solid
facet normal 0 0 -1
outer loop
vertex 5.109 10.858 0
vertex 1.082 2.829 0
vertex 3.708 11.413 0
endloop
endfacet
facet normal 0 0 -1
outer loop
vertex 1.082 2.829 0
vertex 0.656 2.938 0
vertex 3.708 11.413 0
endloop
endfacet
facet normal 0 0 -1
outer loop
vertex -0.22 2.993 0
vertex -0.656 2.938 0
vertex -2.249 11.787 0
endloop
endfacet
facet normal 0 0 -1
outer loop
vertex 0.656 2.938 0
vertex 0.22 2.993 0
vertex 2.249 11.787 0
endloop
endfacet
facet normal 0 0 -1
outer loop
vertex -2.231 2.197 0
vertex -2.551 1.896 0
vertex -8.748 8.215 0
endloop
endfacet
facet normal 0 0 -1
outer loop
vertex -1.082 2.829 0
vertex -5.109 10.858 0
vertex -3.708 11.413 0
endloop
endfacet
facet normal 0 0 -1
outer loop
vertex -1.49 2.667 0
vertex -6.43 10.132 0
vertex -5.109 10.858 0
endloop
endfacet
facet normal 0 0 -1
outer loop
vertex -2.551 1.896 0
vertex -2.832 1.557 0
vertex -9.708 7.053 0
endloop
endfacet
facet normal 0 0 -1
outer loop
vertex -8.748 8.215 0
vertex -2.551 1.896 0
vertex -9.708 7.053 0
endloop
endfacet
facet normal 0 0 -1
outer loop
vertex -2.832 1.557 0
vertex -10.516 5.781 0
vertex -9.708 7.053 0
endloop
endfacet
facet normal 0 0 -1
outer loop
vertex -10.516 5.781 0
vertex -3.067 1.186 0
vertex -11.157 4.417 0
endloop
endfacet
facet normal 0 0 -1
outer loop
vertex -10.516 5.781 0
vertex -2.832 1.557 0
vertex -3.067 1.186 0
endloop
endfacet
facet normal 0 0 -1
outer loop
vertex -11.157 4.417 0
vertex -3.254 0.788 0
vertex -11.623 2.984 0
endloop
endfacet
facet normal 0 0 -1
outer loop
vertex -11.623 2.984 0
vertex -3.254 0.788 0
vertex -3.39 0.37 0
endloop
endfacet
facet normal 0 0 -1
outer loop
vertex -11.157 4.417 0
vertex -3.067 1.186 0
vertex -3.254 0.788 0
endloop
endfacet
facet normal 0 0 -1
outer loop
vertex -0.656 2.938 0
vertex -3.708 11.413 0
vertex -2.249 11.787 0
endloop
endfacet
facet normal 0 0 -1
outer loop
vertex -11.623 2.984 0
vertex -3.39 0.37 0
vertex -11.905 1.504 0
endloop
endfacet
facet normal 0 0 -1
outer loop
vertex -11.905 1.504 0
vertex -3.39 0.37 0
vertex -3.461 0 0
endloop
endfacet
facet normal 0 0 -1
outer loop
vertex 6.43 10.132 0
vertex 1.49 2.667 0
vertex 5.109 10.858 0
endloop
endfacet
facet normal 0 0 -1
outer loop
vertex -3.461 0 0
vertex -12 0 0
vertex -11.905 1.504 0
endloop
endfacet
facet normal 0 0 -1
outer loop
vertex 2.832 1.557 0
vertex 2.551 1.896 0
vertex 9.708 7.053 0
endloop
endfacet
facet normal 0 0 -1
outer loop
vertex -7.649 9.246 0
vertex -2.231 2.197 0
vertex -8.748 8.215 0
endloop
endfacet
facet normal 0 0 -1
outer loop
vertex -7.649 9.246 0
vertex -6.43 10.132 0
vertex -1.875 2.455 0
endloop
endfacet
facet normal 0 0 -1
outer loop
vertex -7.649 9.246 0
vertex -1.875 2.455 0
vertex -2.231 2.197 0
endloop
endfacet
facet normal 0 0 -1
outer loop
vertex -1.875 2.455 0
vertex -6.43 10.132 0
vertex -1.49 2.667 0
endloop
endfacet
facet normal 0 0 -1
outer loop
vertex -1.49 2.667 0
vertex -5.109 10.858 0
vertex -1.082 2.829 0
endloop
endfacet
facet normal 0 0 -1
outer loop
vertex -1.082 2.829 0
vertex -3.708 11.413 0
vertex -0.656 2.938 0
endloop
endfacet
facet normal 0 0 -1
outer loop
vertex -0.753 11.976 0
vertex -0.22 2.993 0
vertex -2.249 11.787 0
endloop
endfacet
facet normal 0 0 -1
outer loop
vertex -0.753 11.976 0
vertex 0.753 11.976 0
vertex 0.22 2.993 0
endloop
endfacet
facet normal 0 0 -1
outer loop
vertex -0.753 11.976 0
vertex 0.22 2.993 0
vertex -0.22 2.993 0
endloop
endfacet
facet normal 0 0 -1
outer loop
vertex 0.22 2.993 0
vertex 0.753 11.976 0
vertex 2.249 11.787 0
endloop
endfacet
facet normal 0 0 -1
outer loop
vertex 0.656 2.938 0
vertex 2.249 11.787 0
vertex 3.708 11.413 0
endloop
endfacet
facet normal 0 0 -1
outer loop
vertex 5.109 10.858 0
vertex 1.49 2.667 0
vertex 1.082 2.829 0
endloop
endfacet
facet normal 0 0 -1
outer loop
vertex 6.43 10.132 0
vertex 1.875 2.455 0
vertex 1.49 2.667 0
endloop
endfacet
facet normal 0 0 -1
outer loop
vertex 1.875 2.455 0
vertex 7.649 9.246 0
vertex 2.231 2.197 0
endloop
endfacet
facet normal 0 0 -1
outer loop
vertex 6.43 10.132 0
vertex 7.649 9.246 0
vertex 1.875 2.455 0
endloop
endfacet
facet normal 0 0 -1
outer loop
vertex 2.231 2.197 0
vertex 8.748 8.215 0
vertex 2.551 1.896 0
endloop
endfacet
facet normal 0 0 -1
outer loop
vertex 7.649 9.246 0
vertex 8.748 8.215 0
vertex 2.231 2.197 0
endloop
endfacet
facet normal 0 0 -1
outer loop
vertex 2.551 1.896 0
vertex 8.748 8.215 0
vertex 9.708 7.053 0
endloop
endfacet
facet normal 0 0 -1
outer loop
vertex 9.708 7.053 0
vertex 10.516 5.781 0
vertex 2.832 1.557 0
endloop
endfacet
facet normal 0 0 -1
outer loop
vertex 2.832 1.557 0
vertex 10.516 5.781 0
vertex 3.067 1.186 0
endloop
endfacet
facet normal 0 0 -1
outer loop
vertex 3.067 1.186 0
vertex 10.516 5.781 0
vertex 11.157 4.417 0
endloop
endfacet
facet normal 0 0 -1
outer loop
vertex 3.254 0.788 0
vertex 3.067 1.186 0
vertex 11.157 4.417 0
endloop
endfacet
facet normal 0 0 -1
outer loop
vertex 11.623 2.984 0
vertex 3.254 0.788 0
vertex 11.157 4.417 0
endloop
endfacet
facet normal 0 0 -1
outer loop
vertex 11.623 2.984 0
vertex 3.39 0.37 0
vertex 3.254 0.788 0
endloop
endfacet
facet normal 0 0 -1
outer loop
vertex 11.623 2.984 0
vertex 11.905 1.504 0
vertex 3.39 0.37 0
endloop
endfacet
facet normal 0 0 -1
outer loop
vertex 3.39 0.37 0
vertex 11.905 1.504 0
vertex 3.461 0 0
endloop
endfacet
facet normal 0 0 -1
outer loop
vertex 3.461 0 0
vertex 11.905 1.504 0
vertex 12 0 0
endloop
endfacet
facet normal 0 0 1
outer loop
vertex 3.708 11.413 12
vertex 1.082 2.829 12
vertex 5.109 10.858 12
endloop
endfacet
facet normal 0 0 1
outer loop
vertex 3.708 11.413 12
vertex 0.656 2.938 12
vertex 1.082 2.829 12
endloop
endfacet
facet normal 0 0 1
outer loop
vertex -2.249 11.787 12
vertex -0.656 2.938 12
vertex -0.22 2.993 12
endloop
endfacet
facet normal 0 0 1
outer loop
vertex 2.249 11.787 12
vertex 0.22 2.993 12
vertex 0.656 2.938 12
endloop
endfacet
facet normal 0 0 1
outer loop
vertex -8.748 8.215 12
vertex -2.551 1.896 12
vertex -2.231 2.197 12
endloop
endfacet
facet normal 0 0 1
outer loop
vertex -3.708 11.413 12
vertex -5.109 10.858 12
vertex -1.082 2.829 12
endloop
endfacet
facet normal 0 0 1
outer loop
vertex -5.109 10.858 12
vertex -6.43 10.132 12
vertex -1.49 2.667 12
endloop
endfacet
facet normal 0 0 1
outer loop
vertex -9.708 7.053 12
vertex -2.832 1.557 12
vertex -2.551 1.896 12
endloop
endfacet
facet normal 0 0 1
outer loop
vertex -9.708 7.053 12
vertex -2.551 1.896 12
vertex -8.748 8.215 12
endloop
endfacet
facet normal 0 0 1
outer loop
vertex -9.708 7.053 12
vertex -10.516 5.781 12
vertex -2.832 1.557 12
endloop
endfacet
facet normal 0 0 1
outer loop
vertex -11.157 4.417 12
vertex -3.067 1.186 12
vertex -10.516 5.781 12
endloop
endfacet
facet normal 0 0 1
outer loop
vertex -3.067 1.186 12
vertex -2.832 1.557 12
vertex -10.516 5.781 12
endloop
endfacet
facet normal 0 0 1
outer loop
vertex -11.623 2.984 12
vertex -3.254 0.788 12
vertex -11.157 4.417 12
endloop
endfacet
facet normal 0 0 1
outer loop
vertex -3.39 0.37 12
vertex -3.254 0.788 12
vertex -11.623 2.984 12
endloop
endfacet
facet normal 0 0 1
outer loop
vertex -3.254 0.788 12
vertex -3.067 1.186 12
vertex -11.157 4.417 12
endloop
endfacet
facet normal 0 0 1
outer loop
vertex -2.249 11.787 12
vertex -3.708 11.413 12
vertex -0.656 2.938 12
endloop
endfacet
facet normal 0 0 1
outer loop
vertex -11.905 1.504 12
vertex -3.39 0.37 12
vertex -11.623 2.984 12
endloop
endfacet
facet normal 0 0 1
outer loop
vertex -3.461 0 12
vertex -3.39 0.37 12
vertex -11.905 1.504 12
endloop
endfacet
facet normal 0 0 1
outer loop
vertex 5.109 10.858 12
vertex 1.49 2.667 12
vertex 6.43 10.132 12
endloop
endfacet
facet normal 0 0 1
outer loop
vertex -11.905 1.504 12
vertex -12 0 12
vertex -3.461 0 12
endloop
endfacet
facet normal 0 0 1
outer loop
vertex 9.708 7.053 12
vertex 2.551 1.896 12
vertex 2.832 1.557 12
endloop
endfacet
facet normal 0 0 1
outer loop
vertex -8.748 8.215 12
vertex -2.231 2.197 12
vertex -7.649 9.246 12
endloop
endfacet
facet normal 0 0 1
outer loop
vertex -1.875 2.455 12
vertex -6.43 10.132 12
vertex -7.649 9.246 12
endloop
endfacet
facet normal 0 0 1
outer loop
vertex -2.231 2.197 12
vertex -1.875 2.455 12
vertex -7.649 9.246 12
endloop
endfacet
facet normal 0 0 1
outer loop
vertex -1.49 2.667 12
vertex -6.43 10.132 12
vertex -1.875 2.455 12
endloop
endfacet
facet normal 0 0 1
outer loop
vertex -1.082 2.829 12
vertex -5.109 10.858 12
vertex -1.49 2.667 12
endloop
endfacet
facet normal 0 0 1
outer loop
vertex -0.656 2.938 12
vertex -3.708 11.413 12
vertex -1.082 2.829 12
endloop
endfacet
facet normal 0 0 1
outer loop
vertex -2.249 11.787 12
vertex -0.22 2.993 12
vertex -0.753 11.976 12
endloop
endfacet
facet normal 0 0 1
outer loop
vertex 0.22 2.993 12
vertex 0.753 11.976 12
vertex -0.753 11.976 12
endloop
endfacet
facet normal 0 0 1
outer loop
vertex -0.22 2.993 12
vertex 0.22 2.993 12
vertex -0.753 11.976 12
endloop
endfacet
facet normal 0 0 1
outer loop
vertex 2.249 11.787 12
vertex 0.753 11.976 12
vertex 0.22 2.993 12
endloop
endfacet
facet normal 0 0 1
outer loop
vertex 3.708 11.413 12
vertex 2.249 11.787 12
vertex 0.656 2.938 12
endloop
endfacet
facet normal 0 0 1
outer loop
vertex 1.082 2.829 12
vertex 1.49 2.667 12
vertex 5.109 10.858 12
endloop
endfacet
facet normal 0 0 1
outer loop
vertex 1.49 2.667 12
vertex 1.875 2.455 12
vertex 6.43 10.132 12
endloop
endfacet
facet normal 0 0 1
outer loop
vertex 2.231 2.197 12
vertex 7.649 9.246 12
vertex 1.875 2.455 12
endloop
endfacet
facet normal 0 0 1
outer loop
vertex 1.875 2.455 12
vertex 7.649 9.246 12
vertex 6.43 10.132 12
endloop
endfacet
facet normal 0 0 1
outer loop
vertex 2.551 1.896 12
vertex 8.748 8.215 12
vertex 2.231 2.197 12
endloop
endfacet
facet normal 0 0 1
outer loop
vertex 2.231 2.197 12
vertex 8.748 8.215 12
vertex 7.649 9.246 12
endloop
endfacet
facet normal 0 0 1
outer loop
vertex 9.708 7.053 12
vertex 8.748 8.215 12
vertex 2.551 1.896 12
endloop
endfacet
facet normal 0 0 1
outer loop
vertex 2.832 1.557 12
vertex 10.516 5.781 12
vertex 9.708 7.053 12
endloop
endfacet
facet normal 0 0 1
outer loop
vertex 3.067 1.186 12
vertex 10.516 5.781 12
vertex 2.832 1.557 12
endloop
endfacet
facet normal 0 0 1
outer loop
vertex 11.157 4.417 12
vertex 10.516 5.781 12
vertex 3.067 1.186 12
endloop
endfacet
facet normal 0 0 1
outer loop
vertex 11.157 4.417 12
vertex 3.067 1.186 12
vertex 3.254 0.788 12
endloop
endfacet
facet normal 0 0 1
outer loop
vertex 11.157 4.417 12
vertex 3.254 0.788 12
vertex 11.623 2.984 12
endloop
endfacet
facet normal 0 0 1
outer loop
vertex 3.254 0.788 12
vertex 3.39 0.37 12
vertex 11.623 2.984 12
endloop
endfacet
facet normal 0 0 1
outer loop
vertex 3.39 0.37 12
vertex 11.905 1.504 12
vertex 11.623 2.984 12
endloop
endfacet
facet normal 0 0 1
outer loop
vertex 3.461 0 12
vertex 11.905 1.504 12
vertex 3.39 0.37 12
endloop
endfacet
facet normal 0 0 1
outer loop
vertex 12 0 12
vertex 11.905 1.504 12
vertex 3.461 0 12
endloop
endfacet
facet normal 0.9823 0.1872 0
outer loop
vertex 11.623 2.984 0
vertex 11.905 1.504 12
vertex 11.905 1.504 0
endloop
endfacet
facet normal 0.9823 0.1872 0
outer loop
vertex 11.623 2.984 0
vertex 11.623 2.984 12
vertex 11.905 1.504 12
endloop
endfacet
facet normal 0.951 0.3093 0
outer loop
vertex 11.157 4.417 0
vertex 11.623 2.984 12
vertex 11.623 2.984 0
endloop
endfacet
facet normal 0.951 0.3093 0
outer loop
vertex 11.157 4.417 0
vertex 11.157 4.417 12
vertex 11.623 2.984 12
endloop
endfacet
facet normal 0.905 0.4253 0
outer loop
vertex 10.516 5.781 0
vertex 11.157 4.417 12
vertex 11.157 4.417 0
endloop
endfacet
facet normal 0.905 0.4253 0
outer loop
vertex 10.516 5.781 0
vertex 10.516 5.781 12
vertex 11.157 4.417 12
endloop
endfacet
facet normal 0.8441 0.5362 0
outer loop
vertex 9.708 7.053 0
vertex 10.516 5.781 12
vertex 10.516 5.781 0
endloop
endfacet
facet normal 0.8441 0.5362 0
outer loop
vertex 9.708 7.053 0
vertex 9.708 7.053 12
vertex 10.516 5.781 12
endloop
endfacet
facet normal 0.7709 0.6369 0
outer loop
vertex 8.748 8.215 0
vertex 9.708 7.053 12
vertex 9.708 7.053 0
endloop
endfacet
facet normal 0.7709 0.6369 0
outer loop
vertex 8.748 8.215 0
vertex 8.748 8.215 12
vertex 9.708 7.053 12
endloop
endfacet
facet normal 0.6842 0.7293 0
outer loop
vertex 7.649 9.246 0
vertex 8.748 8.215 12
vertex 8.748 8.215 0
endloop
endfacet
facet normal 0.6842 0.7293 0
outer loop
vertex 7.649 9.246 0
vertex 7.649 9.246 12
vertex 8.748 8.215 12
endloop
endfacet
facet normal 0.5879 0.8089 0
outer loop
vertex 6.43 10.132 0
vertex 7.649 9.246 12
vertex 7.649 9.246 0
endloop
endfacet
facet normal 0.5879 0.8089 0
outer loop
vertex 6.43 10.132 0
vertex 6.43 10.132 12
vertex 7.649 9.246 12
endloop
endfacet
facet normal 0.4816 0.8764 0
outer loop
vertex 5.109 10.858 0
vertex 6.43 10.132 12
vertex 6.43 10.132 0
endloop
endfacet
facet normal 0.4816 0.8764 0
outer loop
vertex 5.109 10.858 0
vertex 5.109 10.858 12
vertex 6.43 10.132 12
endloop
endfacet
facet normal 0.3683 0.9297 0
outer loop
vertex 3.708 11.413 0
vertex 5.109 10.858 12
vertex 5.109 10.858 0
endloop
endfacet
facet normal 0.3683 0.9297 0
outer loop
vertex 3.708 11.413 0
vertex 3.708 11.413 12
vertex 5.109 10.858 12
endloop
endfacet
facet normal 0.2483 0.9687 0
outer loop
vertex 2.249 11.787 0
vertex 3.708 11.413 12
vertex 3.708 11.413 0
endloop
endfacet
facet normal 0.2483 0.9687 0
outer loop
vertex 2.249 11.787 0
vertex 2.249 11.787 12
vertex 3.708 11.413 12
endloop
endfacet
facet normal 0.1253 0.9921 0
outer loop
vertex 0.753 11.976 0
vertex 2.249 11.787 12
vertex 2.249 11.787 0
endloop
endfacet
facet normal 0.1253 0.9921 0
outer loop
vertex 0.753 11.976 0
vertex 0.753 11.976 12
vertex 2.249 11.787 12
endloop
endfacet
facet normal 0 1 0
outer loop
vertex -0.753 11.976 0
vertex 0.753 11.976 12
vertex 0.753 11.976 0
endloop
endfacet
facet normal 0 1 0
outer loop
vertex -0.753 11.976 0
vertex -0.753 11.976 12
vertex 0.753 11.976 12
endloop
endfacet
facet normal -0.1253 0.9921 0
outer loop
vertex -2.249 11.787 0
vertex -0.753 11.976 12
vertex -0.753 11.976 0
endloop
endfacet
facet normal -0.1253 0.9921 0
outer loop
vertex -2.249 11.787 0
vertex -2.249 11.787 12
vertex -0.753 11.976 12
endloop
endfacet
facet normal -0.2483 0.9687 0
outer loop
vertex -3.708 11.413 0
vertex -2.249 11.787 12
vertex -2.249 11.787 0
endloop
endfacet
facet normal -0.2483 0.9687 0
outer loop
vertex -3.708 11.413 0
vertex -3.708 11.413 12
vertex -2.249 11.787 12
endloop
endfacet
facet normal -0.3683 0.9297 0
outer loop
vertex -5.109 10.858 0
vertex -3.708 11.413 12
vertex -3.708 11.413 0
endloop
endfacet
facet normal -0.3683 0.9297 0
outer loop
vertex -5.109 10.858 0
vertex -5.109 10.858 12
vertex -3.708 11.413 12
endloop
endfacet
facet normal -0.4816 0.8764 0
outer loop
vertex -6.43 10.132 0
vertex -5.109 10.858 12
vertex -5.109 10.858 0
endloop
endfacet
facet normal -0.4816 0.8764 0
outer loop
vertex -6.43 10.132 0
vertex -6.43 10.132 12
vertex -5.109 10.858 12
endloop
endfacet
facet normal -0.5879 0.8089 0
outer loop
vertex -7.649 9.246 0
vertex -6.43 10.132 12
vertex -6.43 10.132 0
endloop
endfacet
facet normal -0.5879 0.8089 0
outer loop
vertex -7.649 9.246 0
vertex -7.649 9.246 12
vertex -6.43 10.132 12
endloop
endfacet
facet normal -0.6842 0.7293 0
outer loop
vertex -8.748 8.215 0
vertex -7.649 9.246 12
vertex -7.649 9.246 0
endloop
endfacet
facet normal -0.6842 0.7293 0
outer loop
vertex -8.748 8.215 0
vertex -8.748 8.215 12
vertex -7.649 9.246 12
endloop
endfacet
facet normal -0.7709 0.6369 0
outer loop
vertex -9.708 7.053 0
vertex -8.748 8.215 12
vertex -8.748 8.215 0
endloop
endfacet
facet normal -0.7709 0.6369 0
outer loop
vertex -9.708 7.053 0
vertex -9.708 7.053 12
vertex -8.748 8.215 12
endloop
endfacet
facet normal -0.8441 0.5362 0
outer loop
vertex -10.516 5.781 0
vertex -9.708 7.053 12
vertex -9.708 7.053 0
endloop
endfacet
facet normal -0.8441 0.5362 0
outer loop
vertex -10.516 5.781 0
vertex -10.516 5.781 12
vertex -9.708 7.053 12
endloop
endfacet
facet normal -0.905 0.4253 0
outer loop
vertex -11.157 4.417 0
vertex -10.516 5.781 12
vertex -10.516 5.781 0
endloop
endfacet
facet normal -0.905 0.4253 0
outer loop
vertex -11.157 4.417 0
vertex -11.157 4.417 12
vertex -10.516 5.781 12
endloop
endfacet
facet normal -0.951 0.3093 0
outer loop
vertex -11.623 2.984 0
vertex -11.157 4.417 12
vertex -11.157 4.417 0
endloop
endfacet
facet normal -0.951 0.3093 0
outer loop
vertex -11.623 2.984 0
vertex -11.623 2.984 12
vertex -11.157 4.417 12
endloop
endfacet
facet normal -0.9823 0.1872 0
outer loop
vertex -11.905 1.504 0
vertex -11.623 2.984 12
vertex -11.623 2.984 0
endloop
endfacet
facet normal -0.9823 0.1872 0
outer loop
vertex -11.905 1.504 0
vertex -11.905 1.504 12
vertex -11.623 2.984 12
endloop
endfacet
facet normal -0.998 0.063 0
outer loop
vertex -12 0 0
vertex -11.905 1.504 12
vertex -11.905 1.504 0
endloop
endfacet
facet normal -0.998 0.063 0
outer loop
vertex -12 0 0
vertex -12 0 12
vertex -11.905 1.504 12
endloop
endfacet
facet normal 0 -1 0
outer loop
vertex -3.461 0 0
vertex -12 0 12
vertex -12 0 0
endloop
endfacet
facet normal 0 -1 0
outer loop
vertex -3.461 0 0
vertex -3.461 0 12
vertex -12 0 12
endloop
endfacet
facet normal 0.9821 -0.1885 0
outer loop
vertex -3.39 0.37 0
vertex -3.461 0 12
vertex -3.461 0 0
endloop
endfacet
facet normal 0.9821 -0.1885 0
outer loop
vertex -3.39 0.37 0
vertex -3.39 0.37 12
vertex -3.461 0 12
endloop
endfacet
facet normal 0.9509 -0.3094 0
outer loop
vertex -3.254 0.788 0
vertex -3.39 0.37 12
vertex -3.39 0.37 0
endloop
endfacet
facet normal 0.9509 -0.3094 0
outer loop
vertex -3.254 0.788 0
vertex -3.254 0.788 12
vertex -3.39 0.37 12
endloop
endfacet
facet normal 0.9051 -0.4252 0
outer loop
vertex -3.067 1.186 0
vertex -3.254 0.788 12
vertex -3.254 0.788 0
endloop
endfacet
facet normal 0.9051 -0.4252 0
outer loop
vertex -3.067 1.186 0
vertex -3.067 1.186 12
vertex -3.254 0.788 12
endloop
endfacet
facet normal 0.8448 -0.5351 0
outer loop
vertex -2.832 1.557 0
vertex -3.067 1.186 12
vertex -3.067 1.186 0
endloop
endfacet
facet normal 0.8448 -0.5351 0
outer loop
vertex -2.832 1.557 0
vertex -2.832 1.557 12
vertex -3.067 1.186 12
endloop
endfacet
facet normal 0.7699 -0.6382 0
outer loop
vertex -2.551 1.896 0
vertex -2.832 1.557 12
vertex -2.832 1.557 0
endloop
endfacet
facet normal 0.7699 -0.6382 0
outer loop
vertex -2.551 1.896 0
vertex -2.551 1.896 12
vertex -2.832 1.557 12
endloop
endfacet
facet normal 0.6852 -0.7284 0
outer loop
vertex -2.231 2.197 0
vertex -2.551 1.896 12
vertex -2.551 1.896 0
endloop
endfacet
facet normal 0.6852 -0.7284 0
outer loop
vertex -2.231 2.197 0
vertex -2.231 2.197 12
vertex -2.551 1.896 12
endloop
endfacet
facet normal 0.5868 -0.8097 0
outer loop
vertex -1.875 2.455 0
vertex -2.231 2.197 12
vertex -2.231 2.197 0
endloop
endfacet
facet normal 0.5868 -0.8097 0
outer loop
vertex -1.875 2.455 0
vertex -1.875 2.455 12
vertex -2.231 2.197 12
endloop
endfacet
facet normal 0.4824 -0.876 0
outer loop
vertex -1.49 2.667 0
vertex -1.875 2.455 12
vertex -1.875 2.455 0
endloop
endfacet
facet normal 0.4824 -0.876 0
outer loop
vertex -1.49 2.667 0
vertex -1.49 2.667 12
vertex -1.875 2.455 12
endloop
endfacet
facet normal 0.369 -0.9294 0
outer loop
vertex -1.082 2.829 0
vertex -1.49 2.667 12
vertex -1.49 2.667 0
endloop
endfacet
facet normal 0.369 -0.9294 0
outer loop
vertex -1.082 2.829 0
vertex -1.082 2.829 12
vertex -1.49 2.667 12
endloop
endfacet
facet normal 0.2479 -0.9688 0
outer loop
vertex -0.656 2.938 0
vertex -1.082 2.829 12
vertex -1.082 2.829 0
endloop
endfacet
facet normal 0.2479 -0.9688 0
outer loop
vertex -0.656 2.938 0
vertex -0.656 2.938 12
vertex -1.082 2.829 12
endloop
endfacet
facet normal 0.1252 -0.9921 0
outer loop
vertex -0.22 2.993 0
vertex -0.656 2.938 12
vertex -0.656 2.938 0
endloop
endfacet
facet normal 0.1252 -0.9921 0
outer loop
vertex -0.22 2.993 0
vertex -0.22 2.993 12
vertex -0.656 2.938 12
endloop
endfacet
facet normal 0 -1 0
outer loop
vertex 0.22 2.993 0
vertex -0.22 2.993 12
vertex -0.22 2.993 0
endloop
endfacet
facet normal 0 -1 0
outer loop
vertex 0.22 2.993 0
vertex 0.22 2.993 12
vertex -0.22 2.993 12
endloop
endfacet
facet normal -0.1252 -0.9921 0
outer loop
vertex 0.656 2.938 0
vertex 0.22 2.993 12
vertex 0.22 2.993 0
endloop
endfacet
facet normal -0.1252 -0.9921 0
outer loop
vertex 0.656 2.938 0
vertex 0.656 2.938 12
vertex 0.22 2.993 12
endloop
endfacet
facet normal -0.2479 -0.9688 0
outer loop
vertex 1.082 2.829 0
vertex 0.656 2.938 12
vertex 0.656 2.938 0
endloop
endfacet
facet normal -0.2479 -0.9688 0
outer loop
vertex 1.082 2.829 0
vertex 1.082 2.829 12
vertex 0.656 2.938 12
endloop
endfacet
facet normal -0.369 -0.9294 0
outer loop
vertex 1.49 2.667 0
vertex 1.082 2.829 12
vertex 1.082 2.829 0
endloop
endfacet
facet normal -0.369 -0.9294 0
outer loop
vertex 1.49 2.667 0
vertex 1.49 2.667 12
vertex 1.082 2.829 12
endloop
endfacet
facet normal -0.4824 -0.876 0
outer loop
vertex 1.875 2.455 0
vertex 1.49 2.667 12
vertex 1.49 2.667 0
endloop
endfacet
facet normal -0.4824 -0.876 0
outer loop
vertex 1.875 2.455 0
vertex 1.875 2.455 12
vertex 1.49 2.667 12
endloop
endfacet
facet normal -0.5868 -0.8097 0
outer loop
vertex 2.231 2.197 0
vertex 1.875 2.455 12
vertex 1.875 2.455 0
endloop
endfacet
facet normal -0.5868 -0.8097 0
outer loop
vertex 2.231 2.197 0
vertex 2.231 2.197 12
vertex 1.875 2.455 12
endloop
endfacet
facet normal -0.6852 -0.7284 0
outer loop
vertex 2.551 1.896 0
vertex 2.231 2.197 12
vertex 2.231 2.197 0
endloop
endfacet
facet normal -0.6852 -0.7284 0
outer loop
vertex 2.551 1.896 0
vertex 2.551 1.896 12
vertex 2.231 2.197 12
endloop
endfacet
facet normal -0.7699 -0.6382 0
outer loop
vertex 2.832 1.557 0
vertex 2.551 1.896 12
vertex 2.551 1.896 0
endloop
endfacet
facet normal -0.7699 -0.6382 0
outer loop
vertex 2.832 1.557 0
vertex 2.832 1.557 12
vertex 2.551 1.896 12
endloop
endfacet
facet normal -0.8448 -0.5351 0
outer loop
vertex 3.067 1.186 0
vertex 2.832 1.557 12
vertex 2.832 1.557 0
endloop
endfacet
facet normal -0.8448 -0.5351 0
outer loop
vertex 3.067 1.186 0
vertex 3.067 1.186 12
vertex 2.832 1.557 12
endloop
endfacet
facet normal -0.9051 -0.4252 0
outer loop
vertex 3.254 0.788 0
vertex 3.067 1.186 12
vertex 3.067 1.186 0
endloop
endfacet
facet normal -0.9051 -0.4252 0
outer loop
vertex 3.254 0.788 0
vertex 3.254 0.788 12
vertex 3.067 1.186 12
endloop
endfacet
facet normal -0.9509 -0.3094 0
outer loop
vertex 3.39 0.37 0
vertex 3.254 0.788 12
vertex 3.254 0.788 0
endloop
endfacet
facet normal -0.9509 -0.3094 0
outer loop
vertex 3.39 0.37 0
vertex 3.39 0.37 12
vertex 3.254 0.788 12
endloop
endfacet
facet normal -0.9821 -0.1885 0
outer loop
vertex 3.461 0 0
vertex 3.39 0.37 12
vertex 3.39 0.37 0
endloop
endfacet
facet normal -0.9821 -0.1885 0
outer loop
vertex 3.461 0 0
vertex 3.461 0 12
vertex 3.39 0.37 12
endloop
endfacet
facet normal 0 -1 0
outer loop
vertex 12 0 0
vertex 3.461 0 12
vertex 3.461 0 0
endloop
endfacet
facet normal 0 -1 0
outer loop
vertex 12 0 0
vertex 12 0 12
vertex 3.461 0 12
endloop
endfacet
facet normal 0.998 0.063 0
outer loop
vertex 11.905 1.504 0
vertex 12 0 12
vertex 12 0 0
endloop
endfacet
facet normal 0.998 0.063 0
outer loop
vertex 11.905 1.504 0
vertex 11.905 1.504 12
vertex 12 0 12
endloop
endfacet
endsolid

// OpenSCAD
$fn = 50;

outer_r = 24 / 2;
inner_r = 7 / 2;
space = 1 / 2;
height = 12;

module rod_2d() {
    difference() {
        circle(outer_r);
        translate([ 0, -space ]) circle(inner_r);
        translate([ 0, -50 ]) square(100, center = true);
    }
}

linear_extrude(height) rod_2d();
